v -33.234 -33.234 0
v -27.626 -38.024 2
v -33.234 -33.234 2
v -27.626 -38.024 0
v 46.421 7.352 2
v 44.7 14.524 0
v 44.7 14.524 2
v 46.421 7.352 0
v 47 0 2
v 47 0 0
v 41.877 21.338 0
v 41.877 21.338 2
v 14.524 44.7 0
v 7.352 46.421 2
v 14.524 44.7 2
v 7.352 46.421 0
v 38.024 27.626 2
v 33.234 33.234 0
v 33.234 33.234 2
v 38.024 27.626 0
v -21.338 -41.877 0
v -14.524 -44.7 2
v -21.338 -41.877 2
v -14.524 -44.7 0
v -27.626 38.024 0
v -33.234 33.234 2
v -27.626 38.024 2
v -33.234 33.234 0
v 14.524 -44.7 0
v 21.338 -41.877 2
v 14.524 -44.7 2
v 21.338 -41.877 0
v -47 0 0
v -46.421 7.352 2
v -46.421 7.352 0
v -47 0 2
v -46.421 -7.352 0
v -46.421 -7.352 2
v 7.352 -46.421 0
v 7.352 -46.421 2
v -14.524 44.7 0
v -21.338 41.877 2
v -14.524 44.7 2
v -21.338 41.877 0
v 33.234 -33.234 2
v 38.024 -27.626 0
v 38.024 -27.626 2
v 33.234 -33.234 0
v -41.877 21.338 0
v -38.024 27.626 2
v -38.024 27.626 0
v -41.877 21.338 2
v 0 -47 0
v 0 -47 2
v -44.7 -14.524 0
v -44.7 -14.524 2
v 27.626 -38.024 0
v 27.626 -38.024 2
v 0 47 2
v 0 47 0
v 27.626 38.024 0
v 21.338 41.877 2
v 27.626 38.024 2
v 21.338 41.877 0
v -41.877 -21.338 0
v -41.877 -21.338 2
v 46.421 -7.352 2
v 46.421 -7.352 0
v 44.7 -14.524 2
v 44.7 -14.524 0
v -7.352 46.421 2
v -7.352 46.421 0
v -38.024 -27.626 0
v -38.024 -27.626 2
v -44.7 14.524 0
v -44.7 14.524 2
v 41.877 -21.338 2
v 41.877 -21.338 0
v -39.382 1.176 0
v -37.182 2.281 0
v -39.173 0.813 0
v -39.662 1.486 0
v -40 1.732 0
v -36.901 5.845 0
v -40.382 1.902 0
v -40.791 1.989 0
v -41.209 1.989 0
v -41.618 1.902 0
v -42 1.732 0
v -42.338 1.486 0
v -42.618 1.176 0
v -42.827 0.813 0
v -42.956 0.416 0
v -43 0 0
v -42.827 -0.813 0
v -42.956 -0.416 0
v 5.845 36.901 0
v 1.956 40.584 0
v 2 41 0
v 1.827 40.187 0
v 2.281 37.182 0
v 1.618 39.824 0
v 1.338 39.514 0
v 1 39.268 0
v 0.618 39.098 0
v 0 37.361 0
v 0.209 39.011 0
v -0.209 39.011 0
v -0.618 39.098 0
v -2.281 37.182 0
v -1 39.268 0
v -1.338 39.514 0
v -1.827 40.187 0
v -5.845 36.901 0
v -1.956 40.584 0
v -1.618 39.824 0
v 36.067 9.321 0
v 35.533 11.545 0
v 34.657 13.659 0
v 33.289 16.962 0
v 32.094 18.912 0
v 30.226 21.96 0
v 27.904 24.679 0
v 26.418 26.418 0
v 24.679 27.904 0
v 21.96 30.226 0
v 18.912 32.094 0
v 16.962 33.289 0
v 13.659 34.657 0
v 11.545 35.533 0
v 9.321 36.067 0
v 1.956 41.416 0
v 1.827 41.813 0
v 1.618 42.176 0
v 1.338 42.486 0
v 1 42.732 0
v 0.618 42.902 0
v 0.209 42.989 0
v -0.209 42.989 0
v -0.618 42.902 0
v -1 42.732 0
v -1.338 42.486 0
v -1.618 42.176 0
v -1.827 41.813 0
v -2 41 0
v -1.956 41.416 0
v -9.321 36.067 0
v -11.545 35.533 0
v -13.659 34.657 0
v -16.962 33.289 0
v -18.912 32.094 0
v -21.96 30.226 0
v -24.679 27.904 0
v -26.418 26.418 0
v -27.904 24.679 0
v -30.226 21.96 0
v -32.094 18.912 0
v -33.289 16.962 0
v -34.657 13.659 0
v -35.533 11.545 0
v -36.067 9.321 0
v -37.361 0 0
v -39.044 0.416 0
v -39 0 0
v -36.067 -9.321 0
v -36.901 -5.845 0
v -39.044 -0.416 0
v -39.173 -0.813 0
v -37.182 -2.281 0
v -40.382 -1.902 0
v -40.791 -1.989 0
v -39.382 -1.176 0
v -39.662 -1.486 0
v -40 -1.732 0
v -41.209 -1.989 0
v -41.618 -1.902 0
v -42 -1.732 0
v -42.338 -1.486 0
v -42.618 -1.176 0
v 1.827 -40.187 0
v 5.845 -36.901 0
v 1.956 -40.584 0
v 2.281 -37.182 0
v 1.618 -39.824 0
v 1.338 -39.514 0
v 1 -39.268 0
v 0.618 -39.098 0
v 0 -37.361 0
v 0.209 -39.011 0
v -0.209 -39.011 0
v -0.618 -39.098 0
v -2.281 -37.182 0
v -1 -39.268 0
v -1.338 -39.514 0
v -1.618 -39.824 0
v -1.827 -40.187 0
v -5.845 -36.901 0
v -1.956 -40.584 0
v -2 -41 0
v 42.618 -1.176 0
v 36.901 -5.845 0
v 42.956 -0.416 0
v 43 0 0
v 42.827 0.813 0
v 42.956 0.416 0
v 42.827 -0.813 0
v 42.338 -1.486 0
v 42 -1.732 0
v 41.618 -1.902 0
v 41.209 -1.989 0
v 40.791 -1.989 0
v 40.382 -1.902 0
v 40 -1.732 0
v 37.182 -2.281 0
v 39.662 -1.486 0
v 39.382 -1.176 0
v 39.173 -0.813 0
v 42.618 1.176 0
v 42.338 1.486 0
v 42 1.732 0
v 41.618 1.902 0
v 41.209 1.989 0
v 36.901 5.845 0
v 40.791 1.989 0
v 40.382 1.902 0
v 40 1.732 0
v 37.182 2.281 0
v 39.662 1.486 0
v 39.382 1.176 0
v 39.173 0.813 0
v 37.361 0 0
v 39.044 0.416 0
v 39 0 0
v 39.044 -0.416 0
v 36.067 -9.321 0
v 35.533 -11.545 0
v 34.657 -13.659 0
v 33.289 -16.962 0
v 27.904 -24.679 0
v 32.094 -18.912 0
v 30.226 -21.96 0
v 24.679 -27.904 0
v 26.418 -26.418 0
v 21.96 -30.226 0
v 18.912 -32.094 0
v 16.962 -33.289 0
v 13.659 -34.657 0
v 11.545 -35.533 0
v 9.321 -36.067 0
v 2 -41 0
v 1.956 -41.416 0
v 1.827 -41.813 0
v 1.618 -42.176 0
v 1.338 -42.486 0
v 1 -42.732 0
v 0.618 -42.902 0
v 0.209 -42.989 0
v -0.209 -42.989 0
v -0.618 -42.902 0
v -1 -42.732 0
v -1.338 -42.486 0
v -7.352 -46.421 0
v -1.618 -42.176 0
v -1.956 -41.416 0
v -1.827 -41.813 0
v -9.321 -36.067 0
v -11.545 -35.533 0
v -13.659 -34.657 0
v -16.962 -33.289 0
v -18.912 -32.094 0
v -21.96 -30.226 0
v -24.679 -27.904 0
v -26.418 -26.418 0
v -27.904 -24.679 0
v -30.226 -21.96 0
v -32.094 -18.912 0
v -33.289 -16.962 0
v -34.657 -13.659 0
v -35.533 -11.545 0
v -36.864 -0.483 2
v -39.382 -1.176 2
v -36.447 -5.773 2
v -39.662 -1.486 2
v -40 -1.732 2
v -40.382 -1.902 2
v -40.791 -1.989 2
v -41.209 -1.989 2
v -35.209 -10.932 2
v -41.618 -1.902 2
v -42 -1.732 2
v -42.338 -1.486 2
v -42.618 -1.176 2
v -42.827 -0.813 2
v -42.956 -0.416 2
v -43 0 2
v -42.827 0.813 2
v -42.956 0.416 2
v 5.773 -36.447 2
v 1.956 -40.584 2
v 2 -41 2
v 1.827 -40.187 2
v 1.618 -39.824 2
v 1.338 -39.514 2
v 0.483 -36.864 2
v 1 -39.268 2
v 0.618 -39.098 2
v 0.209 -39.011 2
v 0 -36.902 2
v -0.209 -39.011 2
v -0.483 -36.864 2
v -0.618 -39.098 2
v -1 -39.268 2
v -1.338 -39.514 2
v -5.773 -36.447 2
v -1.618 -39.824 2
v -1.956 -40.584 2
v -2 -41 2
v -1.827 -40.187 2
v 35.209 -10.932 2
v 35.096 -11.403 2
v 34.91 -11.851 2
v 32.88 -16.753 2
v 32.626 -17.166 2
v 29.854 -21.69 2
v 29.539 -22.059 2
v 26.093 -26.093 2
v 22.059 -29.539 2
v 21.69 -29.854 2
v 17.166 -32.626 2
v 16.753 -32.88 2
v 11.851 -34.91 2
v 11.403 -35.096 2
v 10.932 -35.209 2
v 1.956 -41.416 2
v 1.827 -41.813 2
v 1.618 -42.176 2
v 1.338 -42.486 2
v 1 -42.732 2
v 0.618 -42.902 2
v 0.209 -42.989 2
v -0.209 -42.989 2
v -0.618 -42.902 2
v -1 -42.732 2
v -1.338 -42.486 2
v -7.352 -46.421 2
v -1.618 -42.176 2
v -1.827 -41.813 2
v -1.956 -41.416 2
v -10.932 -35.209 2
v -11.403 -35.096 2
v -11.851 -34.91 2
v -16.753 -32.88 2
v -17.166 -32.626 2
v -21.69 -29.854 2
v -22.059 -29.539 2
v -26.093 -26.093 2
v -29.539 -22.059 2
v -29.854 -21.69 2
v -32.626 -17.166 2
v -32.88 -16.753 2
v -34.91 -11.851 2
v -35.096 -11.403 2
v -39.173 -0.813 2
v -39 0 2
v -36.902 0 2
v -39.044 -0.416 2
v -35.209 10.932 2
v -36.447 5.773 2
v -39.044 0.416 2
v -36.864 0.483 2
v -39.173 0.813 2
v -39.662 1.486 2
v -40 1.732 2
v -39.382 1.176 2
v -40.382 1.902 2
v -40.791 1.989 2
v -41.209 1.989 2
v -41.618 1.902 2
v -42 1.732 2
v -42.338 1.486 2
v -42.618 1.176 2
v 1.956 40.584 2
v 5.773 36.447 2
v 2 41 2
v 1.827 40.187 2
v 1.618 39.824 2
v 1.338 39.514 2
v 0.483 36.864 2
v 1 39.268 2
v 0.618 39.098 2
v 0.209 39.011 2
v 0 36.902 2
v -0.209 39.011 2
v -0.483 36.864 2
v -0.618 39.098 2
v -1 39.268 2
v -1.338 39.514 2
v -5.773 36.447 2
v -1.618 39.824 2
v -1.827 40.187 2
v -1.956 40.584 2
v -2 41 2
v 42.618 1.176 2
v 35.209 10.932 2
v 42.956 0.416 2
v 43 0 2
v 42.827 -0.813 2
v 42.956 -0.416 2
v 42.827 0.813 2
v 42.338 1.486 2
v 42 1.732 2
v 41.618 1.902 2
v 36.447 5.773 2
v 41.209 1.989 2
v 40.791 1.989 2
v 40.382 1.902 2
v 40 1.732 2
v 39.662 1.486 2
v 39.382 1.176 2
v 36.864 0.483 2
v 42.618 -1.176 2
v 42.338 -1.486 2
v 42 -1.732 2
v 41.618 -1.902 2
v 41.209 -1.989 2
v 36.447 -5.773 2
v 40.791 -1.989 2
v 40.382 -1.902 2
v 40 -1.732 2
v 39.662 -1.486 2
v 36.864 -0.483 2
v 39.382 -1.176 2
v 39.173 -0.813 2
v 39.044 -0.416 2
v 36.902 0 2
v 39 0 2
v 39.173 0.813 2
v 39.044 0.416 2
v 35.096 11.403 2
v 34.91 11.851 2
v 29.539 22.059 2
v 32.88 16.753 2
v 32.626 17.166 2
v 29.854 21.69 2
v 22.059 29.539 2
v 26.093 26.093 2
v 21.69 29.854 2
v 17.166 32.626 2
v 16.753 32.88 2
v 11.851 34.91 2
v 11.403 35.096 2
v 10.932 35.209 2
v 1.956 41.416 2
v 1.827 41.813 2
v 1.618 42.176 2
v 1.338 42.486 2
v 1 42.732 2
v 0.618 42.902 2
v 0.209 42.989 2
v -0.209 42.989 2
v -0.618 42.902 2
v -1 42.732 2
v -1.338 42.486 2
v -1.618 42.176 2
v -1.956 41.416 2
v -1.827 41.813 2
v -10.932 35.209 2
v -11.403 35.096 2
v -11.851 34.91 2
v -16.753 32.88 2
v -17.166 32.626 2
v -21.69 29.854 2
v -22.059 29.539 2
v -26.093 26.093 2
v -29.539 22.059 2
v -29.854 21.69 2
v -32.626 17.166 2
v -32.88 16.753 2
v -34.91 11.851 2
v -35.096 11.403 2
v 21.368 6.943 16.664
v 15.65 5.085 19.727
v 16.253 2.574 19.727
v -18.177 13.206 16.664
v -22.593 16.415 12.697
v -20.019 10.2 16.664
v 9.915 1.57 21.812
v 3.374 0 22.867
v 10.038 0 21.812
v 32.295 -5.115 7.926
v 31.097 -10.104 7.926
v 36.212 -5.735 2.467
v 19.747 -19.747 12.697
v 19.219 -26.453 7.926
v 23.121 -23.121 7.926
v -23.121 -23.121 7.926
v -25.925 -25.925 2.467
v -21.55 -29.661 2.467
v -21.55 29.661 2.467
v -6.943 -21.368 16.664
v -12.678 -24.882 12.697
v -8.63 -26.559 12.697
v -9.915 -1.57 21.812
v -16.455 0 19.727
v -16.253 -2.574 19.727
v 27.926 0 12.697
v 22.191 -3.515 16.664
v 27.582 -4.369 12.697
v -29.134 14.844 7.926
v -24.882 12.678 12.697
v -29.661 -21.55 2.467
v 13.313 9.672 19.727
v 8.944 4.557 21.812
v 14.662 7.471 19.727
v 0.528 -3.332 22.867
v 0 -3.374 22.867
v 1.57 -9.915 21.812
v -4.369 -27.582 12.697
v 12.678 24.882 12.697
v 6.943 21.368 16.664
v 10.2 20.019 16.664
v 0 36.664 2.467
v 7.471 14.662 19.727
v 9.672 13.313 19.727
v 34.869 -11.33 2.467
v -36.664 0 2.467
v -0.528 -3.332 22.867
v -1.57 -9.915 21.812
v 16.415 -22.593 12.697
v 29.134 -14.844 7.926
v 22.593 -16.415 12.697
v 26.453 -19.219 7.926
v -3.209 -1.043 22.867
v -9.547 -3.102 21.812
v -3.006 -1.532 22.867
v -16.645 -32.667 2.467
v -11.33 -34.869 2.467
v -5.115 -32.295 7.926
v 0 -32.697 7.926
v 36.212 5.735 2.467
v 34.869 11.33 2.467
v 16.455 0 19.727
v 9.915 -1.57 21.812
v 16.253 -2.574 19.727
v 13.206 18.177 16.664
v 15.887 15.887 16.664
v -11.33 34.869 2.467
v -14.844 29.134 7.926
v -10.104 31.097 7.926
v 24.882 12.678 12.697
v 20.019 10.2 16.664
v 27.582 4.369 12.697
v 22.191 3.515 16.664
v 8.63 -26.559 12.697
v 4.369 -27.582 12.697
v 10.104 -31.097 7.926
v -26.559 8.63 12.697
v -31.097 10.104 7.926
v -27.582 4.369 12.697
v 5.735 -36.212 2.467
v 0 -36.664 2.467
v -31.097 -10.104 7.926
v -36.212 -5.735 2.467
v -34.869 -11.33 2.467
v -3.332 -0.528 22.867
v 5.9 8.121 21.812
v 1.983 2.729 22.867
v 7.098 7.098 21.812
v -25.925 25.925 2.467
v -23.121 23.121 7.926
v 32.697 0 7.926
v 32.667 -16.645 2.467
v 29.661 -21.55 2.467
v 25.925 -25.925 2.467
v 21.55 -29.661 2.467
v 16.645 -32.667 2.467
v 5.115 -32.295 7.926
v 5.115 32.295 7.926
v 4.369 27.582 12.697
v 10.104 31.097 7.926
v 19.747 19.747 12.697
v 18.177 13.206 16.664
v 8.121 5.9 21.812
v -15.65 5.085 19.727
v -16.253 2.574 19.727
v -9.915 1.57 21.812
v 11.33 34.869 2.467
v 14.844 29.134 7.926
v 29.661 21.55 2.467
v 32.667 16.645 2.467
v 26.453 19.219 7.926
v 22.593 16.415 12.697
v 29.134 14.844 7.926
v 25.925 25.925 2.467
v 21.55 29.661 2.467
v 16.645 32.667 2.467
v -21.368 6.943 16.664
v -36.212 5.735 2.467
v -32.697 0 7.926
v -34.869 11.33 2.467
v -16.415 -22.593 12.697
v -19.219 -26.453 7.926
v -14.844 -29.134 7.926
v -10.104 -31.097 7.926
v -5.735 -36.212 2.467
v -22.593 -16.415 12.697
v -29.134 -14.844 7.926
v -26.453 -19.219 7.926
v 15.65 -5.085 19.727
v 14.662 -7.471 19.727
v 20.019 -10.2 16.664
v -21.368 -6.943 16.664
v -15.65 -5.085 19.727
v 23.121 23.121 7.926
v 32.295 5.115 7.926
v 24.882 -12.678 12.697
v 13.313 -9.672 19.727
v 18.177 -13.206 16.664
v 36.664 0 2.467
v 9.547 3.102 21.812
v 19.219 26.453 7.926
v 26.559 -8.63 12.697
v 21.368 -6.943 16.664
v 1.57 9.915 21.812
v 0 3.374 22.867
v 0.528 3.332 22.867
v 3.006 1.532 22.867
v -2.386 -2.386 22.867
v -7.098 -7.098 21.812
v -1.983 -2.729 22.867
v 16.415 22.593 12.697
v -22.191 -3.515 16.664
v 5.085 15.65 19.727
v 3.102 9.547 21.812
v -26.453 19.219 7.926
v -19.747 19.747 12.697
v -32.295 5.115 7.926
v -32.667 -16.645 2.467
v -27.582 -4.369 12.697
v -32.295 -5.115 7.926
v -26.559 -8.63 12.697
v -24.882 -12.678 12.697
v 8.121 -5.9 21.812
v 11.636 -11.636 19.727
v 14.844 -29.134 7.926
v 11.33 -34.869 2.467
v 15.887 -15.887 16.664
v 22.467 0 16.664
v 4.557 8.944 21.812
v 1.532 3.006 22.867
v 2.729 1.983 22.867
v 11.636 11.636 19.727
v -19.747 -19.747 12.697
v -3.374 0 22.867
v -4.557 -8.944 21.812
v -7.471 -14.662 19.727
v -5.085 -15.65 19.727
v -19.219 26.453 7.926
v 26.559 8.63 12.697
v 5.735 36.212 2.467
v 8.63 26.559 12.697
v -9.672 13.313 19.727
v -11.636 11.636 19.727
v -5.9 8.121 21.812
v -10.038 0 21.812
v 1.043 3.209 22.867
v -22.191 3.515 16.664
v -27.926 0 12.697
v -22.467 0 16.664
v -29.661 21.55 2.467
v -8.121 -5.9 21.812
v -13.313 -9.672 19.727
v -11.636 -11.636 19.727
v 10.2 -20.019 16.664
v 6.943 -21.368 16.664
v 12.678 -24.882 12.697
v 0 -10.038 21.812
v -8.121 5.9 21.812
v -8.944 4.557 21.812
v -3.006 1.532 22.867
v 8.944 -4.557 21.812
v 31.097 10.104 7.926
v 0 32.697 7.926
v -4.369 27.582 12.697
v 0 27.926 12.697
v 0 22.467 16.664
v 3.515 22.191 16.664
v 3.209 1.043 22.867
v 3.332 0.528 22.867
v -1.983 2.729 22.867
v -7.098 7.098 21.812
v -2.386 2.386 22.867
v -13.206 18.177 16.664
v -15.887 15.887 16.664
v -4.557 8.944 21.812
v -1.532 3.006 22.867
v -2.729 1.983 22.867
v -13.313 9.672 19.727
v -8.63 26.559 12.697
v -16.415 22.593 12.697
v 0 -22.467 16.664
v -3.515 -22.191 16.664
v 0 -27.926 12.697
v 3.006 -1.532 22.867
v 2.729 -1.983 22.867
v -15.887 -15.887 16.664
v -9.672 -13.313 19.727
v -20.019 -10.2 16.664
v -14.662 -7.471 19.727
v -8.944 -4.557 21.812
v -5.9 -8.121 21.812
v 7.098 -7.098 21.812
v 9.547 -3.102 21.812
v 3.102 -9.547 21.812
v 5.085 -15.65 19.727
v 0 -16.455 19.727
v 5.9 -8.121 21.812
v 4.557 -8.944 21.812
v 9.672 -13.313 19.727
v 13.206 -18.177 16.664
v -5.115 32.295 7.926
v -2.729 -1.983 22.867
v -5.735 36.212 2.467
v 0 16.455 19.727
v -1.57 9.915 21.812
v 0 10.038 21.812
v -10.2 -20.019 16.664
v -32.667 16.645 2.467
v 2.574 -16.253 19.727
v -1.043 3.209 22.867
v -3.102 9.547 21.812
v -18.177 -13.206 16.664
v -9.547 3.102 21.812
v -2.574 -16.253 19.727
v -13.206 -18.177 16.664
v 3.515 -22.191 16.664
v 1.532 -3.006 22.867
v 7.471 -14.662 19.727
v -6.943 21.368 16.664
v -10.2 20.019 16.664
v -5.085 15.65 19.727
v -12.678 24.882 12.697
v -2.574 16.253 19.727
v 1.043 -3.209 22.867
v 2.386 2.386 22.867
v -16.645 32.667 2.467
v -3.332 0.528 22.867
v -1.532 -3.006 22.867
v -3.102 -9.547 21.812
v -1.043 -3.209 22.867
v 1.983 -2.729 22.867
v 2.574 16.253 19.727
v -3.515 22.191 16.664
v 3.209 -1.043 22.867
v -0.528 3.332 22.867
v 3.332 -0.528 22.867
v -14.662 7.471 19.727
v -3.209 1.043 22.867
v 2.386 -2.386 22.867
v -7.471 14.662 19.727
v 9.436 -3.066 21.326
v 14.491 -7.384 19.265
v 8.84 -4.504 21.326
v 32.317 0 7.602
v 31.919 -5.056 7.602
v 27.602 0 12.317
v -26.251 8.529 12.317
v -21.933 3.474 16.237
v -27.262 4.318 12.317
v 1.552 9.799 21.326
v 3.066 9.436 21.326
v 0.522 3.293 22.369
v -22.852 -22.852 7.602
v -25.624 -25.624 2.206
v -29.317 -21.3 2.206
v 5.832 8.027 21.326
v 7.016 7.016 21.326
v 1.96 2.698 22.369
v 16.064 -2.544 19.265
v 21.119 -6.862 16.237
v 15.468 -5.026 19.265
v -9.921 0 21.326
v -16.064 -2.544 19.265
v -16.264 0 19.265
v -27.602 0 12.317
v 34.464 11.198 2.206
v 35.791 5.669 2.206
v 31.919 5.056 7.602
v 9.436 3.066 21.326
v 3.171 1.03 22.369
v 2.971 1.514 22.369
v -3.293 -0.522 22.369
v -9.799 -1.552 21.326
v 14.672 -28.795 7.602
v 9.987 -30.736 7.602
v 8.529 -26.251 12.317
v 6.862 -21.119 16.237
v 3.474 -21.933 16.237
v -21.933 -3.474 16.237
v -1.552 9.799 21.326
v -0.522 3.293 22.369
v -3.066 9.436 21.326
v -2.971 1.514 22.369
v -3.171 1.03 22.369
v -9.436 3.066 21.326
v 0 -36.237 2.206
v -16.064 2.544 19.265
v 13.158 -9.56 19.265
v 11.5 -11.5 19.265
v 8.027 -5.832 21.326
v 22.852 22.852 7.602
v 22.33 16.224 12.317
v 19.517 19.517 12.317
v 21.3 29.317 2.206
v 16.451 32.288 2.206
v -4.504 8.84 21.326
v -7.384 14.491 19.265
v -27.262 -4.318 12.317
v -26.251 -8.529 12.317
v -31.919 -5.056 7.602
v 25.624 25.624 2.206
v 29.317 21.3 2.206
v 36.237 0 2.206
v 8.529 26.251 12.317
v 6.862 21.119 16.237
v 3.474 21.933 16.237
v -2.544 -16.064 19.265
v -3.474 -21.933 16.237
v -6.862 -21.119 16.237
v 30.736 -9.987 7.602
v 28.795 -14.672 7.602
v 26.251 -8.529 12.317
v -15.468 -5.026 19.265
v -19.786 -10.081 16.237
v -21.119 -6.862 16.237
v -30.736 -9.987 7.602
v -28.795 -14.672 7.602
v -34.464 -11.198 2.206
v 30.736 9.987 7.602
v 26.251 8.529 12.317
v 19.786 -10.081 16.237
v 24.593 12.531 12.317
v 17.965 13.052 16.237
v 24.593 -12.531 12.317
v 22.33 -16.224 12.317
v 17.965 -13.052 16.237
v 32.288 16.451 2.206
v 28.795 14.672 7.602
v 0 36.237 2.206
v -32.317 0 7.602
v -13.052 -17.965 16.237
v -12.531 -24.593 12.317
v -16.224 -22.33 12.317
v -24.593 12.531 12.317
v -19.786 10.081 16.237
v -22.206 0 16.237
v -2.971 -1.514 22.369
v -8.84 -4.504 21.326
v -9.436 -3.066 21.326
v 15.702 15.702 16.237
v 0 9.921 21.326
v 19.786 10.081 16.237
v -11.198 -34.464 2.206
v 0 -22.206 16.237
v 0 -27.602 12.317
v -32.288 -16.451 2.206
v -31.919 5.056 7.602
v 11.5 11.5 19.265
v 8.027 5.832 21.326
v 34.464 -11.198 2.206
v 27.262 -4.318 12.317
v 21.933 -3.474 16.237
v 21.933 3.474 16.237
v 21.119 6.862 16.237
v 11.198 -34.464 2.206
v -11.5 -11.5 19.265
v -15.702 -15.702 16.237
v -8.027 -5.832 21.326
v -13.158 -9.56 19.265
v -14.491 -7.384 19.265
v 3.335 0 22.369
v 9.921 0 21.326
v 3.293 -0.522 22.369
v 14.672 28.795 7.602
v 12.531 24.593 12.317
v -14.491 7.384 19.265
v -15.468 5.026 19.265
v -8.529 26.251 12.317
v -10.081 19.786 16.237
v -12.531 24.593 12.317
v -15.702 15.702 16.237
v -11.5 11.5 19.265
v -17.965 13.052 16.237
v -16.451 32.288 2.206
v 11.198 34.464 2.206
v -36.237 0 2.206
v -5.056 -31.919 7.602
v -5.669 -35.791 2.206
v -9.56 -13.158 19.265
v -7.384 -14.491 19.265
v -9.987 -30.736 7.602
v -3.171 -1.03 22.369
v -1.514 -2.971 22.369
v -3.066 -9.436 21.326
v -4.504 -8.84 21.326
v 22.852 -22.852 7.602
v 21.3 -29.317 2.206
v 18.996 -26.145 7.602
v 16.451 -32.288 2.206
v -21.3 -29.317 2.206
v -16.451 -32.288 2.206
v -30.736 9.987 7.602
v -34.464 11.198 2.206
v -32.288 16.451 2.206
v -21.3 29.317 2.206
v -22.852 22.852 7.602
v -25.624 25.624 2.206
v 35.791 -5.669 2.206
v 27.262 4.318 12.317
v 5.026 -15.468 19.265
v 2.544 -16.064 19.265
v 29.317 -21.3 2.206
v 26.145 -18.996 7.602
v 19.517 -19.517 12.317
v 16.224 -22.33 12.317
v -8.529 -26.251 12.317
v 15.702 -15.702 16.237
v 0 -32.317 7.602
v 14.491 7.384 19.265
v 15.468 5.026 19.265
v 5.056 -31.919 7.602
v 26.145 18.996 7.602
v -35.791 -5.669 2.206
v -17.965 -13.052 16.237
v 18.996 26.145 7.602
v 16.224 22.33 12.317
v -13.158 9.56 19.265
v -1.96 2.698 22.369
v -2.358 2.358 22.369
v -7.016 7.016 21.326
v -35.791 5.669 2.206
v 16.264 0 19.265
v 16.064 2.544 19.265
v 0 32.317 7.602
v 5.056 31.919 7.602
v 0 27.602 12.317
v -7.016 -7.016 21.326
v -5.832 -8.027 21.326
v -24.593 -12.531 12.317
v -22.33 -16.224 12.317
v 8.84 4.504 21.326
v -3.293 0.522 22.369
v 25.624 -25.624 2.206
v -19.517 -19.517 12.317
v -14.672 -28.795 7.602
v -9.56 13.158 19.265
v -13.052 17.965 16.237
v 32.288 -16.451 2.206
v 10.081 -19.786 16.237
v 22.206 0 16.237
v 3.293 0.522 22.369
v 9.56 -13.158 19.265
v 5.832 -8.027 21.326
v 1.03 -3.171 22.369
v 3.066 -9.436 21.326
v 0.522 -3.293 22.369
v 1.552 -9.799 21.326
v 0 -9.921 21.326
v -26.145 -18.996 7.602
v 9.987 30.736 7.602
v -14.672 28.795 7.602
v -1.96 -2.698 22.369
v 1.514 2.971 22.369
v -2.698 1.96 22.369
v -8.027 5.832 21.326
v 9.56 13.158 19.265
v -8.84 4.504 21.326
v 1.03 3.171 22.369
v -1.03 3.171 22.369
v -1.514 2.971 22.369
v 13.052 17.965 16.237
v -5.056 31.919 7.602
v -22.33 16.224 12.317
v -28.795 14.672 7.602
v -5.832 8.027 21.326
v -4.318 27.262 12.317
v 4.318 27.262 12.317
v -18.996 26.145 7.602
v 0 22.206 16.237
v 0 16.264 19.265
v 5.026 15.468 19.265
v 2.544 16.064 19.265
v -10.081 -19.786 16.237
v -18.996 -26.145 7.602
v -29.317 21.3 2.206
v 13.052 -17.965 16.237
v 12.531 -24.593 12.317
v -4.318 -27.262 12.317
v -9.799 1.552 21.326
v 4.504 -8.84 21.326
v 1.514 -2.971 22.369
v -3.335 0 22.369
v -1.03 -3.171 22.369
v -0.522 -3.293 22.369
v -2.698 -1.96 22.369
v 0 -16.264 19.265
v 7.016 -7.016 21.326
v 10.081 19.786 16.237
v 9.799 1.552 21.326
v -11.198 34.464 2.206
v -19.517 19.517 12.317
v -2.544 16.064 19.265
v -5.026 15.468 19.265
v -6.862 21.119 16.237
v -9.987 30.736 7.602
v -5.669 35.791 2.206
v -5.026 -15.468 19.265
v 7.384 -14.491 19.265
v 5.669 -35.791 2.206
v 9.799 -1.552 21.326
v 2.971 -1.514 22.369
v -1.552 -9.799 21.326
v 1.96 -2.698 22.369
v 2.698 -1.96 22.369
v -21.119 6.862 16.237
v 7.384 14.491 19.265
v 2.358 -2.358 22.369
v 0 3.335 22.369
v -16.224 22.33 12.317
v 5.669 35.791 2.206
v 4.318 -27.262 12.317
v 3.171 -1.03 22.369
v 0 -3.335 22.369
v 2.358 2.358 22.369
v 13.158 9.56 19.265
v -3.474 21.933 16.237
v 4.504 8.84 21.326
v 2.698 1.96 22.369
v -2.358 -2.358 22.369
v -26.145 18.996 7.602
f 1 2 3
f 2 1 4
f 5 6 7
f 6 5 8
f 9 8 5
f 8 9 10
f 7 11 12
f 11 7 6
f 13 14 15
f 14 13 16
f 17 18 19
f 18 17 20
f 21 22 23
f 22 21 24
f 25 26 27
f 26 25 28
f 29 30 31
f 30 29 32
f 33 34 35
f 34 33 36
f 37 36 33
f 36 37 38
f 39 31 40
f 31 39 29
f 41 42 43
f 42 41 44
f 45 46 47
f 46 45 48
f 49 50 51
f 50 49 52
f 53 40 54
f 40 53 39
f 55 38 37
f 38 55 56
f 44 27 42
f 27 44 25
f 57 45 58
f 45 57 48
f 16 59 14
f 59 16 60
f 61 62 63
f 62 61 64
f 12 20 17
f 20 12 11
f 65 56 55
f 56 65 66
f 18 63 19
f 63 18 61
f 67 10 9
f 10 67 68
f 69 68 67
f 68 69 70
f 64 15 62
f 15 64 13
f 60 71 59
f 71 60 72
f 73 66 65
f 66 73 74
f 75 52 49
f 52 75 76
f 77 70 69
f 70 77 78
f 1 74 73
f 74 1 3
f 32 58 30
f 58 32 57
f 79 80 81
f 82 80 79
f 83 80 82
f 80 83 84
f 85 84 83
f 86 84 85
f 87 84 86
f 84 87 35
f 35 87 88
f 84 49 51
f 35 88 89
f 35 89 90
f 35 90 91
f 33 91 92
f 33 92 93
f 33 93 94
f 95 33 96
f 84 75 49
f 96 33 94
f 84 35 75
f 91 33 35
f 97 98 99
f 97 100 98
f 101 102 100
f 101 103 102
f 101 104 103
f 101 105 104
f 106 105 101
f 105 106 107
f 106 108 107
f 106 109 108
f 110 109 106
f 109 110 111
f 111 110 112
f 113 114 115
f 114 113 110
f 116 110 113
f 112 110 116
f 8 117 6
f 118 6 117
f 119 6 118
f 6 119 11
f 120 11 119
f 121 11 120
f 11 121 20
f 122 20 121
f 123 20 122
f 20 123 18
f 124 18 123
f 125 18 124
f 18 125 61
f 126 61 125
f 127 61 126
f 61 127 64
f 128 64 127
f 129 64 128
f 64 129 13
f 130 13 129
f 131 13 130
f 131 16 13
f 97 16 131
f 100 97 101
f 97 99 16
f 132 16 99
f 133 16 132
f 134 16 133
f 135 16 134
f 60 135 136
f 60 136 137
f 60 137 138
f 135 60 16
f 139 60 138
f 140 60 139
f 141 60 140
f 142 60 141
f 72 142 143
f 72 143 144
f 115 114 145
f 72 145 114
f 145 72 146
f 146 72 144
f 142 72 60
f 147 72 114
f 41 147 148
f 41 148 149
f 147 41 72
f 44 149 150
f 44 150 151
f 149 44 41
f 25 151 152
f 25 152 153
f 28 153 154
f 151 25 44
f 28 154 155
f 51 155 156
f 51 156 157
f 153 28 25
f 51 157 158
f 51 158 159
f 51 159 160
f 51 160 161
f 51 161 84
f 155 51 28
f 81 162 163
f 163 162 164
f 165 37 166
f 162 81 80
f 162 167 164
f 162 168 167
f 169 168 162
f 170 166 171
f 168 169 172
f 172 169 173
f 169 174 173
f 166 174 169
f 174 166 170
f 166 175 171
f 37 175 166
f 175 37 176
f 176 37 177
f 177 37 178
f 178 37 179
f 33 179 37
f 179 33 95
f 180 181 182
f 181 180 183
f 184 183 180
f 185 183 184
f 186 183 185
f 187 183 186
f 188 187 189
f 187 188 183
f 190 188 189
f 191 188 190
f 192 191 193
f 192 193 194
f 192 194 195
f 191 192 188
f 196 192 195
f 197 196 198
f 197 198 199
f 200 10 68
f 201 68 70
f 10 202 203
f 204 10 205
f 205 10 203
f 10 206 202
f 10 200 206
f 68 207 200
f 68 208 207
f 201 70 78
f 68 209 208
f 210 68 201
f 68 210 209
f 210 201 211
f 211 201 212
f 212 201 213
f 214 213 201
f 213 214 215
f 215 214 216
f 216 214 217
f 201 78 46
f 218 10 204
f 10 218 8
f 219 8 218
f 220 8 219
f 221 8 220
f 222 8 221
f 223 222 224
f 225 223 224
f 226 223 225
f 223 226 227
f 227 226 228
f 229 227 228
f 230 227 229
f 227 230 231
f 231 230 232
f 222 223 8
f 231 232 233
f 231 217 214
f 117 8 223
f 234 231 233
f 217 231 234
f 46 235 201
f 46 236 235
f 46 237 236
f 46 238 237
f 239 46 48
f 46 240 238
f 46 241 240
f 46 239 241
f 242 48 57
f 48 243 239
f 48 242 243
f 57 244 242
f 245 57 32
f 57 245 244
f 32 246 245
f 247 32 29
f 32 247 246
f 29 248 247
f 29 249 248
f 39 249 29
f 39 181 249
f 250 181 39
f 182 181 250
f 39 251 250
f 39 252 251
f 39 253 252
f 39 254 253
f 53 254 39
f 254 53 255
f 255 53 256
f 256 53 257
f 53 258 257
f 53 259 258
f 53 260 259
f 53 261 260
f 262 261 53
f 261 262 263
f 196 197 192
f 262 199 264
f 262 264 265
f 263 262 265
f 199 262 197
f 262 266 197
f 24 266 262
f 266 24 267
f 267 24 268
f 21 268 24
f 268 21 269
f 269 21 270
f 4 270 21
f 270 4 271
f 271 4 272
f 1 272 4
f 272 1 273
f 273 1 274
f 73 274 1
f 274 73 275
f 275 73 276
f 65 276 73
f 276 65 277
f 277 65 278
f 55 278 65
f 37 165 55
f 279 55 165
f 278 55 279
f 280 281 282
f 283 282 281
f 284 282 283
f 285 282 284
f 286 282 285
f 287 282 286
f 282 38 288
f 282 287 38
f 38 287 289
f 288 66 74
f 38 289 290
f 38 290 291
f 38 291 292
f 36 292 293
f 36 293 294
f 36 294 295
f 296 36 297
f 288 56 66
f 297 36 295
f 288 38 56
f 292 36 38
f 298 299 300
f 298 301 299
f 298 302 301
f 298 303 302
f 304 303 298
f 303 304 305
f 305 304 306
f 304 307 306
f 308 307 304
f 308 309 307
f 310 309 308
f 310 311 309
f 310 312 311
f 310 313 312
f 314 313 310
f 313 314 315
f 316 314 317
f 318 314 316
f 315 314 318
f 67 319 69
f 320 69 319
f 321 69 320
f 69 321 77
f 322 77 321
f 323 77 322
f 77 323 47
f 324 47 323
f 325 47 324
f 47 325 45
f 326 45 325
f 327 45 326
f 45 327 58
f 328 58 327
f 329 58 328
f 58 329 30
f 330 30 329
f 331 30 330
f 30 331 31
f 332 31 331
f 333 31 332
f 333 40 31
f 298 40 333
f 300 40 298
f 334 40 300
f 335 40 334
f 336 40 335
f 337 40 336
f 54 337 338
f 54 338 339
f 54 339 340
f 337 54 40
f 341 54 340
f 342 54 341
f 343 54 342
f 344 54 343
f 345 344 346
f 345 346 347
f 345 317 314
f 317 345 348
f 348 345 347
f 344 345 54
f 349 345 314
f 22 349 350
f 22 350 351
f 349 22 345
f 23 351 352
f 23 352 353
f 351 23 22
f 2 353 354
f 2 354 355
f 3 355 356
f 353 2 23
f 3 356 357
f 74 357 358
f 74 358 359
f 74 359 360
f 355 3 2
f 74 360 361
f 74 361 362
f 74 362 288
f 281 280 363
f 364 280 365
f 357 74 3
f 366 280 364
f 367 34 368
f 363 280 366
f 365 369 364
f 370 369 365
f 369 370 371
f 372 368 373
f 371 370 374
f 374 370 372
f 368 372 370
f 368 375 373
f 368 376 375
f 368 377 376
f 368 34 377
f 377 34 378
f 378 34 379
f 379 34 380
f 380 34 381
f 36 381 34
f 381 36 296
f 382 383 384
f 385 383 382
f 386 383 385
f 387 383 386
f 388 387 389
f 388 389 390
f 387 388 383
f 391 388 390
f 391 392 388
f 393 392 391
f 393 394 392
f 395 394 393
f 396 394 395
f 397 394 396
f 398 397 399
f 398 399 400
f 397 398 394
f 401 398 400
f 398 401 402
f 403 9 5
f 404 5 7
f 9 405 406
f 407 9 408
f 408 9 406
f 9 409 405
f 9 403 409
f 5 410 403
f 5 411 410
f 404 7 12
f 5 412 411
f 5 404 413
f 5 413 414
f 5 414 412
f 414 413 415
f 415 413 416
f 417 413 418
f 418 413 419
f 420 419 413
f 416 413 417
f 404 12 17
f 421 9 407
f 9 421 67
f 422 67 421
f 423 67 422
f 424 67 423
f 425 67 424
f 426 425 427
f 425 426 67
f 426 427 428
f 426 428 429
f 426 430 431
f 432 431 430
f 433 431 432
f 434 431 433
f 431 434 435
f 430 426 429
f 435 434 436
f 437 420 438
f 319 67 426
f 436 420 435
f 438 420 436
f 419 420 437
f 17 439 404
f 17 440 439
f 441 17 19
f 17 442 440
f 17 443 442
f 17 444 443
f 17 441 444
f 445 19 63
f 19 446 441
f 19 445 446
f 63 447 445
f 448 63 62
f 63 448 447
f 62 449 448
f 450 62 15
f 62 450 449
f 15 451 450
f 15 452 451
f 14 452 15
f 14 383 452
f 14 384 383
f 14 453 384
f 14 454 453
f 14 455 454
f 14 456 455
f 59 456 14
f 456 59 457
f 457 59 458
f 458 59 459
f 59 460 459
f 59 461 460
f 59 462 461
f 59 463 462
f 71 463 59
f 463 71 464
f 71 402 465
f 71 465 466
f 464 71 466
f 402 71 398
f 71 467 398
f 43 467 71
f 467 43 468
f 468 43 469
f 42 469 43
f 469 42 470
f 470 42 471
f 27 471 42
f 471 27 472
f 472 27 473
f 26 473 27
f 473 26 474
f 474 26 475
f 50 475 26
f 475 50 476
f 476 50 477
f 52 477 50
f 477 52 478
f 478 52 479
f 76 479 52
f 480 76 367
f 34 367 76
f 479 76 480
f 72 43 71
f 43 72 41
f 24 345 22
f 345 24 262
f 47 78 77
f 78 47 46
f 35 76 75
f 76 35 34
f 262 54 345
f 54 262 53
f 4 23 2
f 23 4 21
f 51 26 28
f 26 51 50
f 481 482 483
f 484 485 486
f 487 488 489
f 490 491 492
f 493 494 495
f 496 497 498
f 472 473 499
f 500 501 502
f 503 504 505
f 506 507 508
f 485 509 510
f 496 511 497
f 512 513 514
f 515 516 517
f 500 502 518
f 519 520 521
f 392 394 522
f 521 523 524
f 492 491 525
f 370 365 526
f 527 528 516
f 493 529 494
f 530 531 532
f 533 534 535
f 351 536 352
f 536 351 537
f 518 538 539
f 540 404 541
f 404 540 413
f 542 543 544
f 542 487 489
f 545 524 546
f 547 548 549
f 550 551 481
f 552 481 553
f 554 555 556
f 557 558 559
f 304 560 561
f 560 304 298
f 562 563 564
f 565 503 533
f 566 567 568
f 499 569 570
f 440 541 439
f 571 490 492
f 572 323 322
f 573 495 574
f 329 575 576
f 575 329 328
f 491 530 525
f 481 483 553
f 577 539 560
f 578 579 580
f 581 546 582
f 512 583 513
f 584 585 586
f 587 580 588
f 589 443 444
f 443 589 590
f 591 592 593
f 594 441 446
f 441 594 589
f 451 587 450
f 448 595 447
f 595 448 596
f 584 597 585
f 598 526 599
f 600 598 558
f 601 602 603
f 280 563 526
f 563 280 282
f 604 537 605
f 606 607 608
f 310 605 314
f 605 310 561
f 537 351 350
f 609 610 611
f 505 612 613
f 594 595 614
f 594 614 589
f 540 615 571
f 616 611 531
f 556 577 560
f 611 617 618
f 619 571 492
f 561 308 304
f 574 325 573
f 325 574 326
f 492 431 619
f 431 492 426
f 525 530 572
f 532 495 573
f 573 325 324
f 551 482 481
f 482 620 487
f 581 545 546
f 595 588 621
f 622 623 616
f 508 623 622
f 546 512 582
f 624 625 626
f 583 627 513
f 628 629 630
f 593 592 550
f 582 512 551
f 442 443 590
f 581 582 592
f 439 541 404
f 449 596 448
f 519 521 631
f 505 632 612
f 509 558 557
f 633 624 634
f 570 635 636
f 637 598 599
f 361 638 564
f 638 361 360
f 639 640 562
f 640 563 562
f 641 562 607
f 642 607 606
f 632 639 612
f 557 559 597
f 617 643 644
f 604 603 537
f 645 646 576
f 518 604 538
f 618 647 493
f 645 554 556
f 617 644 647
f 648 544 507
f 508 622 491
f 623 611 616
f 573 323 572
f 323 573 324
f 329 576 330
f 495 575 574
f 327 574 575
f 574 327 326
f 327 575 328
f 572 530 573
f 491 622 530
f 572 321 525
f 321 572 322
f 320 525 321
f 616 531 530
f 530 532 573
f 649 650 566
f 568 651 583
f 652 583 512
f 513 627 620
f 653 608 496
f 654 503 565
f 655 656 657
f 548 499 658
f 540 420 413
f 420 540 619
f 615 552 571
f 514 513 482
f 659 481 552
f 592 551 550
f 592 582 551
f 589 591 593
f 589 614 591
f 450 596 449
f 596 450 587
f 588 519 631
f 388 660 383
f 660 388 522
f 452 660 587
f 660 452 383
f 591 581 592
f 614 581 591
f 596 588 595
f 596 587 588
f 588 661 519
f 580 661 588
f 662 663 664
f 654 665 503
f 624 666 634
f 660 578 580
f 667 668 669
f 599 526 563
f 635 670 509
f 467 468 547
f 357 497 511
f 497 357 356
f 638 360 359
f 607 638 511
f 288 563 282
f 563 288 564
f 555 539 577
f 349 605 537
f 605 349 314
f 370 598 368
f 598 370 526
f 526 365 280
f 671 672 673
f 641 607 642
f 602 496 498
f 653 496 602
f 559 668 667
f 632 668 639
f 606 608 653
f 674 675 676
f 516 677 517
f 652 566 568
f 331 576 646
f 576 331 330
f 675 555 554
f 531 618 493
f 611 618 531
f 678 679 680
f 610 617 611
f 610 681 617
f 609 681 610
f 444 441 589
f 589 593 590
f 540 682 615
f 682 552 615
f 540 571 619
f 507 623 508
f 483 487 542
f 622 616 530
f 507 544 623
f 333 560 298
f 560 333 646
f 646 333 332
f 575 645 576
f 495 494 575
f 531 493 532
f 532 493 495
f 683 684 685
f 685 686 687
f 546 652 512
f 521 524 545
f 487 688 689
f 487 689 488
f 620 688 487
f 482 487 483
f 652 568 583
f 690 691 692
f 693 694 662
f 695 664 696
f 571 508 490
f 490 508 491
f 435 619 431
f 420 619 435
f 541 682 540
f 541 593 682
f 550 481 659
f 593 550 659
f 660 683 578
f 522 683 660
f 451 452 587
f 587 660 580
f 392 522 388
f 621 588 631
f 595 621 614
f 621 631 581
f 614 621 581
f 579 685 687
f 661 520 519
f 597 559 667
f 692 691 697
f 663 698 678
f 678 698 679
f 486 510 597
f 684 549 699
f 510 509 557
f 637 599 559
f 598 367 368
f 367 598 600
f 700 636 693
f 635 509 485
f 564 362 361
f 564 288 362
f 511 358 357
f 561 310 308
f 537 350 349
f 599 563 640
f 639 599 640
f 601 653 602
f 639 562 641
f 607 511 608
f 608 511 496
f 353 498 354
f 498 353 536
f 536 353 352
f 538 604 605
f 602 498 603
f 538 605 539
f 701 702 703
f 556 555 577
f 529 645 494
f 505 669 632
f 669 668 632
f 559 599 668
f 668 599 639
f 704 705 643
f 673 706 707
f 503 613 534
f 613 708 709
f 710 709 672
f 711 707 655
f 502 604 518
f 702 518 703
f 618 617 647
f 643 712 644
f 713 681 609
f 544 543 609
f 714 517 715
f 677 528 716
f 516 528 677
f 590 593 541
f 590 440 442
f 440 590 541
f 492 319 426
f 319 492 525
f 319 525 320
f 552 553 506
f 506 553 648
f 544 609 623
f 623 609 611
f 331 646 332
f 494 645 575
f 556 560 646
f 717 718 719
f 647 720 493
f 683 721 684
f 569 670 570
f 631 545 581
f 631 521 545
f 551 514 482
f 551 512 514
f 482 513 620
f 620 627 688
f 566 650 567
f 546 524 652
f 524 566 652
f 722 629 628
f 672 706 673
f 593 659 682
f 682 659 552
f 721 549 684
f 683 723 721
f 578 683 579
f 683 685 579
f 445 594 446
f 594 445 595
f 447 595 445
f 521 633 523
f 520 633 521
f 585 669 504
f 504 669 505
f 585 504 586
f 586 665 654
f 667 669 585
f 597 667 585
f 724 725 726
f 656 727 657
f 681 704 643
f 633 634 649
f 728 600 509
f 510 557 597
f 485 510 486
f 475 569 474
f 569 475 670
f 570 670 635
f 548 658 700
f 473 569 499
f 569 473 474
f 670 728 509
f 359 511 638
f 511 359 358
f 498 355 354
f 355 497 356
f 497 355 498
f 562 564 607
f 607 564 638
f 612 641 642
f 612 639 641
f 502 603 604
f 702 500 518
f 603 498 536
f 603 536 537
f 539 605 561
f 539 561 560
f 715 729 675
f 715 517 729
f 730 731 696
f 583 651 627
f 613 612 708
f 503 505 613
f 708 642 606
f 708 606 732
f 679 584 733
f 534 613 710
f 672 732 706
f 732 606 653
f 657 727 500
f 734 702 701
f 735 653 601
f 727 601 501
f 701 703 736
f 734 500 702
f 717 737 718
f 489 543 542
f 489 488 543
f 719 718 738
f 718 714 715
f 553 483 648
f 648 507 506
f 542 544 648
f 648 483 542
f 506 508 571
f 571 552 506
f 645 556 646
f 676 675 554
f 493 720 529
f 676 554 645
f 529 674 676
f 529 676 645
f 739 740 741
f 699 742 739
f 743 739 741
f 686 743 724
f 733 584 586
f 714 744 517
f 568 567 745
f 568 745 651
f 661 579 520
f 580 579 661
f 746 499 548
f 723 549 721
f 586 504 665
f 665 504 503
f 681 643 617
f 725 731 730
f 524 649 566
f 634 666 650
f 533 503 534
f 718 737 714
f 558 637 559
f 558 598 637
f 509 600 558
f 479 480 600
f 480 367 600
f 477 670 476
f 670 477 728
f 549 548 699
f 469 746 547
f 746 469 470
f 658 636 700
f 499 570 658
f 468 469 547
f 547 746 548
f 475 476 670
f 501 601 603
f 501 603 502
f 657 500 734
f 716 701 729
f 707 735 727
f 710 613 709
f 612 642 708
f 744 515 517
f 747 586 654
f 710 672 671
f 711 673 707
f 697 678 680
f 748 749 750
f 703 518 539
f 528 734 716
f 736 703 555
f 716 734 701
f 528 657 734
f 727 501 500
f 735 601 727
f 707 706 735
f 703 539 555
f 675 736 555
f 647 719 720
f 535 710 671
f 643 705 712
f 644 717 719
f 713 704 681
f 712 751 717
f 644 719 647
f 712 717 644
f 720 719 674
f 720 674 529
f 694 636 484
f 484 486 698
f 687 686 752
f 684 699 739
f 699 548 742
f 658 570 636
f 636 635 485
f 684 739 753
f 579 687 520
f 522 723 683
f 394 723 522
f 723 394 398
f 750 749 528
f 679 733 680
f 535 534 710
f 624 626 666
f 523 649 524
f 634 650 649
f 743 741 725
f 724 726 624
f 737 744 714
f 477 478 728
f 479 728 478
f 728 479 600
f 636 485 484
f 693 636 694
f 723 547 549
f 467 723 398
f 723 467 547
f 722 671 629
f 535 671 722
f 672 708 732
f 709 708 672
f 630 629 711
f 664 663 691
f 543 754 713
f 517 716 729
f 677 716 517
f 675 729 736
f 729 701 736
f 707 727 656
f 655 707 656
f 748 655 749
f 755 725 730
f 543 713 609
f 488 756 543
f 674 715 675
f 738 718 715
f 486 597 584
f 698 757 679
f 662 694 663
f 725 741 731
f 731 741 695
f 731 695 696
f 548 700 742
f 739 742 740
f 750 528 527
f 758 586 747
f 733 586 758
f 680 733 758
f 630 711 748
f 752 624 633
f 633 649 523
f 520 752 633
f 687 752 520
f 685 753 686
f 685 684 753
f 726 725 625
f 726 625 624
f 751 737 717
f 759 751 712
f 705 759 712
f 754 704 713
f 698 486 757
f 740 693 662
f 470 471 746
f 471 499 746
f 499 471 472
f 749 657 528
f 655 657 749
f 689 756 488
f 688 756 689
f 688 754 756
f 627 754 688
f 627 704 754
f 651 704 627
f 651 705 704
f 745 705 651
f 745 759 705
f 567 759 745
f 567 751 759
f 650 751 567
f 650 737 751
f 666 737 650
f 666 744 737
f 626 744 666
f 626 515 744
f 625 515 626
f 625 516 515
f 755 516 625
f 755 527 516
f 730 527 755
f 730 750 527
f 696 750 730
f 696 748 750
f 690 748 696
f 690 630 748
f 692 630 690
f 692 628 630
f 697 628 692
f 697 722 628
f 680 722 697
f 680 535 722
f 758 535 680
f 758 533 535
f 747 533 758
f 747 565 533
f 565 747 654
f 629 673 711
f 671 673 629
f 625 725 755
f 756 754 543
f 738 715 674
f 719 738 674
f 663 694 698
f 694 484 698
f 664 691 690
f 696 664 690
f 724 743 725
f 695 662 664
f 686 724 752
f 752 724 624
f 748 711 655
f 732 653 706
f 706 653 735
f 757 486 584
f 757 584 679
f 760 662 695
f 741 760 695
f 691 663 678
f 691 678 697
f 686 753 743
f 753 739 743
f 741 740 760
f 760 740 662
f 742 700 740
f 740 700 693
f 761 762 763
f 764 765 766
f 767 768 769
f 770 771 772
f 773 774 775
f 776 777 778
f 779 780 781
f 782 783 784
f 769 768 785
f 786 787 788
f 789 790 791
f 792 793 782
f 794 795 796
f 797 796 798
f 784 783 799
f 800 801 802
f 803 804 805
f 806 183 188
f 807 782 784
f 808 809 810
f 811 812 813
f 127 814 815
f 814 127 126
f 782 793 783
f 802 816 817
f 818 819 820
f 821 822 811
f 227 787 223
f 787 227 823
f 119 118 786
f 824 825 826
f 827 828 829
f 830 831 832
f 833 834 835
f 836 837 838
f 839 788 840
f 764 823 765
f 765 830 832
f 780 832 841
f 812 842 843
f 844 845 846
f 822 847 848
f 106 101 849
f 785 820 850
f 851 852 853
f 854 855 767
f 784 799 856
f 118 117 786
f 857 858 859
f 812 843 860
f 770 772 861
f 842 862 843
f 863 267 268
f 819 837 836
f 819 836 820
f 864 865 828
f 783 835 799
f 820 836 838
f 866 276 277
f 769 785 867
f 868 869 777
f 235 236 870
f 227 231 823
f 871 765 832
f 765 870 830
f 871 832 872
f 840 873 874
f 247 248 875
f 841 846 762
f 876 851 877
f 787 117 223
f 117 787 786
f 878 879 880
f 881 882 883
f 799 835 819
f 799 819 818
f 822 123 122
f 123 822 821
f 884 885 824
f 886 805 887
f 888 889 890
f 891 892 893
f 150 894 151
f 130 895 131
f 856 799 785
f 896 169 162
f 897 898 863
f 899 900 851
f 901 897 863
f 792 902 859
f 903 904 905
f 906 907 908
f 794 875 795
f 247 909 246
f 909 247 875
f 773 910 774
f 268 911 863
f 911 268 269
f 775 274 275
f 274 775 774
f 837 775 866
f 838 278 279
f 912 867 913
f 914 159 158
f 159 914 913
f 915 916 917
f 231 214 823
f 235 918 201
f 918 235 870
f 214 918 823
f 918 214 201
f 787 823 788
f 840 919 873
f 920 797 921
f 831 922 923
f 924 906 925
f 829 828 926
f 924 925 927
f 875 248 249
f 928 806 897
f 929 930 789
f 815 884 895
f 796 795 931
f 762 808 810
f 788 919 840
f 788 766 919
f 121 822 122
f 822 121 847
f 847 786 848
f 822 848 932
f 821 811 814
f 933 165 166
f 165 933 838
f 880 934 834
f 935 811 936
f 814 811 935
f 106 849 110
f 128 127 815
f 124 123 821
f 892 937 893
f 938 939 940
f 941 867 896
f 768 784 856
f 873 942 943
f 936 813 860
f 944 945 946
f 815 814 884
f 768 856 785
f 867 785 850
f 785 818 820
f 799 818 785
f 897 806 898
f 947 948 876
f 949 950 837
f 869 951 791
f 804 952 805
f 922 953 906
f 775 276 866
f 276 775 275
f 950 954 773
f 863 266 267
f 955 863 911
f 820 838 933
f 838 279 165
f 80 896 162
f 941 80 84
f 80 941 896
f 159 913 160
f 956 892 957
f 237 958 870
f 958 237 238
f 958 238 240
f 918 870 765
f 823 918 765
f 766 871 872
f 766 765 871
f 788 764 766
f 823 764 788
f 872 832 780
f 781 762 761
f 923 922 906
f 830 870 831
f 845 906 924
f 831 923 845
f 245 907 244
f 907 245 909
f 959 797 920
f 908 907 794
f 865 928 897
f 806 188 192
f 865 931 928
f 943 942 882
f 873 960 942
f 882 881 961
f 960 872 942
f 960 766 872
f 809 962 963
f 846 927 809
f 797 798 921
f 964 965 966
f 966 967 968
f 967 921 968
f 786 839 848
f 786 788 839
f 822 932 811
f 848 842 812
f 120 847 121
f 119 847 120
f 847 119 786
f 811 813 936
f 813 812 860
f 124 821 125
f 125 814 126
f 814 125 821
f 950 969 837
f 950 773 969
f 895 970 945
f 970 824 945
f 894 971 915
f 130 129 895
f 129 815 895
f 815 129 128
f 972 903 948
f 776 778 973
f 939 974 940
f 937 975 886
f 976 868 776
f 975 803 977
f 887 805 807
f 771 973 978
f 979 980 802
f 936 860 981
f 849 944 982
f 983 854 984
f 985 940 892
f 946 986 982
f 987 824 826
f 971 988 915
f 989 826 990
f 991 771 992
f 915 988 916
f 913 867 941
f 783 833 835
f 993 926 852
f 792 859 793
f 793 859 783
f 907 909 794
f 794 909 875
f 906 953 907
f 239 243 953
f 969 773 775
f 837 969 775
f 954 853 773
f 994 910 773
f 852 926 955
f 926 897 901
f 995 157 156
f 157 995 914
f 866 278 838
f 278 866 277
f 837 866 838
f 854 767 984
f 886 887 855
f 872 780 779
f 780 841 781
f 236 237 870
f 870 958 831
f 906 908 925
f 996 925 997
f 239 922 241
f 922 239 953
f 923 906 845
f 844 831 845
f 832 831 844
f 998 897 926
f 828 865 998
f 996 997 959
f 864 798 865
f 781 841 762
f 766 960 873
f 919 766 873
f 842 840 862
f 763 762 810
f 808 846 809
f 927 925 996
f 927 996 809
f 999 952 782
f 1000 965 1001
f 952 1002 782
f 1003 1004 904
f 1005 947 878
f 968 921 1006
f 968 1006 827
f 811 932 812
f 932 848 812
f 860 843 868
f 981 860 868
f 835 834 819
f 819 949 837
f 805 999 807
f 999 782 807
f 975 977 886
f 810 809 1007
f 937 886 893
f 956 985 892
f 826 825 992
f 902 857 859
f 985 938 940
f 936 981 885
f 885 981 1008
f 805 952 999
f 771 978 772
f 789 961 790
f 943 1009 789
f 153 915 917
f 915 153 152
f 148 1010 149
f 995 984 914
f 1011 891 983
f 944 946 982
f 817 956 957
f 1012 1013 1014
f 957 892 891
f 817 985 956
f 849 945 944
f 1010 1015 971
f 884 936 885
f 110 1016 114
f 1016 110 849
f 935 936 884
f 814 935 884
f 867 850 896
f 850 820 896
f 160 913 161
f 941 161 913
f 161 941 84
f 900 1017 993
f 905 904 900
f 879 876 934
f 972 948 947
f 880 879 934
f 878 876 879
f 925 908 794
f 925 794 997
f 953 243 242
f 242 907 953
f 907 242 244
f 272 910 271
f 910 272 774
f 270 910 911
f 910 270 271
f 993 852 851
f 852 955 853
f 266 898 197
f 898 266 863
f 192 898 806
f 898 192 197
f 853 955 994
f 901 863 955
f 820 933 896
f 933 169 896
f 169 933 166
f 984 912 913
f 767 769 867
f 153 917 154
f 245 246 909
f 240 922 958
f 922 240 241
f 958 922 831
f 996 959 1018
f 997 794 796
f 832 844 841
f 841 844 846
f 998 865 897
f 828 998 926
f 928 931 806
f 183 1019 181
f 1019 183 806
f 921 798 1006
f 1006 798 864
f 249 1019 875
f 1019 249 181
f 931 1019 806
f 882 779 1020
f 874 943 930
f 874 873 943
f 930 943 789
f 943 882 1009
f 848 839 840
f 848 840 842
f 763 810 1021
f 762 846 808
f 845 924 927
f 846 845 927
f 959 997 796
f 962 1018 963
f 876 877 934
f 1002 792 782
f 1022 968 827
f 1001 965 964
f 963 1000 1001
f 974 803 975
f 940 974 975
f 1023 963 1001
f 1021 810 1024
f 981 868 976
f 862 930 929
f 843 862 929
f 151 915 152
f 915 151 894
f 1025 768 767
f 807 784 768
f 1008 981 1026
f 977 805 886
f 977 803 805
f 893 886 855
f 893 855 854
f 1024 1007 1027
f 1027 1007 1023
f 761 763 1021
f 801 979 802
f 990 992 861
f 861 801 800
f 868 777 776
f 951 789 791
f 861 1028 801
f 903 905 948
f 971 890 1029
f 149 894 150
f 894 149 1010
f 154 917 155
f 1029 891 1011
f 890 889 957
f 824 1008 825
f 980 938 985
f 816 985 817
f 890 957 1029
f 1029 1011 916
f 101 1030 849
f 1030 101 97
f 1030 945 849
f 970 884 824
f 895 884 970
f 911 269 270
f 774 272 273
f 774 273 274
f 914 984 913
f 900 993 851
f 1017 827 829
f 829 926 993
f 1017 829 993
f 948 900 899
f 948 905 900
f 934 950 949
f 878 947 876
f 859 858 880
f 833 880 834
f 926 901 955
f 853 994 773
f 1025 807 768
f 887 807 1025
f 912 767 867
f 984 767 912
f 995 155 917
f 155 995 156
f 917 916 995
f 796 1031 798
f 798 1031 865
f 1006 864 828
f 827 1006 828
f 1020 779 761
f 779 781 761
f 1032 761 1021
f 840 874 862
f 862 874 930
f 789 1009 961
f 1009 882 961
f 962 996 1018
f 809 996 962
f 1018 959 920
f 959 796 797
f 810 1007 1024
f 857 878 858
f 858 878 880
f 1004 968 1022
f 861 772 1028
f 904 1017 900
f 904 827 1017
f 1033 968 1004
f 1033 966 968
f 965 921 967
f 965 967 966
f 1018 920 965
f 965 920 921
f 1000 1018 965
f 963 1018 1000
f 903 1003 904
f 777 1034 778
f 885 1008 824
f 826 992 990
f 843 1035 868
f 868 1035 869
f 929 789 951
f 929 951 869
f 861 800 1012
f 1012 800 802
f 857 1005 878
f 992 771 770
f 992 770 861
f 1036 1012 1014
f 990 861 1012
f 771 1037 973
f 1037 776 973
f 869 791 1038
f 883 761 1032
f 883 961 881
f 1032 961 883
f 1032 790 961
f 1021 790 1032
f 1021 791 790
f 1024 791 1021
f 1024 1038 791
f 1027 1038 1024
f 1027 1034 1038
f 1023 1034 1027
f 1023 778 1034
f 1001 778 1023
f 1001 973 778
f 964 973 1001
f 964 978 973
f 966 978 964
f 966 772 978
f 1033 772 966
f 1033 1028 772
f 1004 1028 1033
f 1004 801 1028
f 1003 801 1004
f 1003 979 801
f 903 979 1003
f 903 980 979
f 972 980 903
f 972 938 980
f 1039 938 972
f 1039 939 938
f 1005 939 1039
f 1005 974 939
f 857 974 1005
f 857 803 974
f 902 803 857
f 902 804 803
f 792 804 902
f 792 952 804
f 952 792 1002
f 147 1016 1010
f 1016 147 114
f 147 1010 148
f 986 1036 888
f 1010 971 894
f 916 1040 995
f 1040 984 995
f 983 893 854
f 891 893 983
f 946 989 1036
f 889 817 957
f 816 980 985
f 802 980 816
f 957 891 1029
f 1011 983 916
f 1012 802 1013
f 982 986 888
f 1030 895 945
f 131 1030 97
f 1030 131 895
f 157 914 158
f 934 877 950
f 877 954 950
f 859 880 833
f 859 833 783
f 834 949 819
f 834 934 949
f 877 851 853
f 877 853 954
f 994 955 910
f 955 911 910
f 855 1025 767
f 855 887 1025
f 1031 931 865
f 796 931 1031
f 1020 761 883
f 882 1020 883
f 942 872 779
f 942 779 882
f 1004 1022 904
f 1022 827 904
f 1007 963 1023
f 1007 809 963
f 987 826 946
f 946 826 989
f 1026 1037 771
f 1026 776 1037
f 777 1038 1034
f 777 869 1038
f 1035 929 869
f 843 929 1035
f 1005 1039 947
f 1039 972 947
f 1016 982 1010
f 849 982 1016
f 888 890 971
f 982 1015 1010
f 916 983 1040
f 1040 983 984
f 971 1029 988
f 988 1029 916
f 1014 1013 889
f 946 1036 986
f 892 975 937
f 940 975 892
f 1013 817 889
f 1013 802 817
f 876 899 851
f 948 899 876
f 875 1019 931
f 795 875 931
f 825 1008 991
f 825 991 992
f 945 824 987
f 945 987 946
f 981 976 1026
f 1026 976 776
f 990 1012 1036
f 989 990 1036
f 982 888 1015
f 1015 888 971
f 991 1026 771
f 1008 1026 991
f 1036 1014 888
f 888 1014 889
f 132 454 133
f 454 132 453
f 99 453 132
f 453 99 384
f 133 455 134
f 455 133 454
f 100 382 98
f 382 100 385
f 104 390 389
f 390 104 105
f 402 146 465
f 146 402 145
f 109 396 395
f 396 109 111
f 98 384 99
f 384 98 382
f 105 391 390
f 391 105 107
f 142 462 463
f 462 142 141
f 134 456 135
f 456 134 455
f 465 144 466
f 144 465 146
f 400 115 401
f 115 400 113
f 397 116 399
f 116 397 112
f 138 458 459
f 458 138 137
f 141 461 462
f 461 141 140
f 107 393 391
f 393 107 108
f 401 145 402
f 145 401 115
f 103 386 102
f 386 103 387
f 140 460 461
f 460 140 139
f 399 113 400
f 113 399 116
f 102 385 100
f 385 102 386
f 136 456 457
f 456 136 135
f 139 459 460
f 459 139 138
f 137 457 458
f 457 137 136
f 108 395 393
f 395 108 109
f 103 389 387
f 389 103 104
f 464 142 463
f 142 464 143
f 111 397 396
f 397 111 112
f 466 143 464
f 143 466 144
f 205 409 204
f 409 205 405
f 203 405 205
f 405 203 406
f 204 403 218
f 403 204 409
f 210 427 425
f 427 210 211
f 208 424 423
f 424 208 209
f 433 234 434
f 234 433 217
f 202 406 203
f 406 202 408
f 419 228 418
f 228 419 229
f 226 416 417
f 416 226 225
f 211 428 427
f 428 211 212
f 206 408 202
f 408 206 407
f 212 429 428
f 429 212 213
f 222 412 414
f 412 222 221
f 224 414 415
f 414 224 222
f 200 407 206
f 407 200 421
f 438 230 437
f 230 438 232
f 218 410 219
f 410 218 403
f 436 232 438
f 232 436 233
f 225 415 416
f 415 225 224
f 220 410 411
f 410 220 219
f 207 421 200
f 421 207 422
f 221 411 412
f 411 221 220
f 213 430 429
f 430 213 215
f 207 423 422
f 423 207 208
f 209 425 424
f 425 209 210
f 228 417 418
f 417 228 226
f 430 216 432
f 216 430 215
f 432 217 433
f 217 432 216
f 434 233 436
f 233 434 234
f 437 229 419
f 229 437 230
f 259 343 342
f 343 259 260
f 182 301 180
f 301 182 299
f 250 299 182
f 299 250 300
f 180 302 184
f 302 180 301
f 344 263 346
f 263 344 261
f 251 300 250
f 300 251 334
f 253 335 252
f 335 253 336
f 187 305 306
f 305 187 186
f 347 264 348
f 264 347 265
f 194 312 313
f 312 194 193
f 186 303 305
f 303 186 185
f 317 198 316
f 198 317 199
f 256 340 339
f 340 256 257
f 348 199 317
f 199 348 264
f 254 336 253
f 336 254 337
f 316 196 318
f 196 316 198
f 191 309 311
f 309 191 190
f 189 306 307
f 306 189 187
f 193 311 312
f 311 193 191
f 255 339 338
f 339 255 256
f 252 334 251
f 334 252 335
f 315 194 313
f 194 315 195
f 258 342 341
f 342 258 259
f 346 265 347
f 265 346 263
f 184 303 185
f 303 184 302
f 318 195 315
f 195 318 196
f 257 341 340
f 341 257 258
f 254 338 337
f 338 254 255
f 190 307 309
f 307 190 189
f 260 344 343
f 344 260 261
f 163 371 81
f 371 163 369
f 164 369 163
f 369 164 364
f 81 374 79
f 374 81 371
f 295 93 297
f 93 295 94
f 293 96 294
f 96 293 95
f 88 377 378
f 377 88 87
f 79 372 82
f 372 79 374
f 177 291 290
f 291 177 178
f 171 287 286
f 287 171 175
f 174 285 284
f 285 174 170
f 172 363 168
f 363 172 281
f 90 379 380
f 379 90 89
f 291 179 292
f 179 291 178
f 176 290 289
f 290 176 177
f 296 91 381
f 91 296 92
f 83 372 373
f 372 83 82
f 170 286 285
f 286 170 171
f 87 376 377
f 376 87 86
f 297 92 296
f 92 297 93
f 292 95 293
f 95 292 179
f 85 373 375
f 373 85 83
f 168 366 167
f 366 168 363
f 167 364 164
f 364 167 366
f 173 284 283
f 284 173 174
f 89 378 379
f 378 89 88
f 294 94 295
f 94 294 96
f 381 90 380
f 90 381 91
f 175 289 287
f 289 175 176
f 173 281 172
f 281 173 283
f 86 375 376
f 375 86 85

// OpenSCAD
// Eduardo Blanco Bielsa - UO285176
module placa(hc1, dc1, fnc1, des1, fnes, hc2, des2){
    difference(){
        esferaHueca(des1, fnes, hc2, des2);
        translate([0,41,-2])
        cylinder (h = hc1, d=dc1, $fn=fnc1);
        translate([41,0,-2])
        cylinder (h = hc1, d=dc1, $fn=fnc1);
        translate([0,-41,-2])
        cylinder (h = hc1, d=dc1, $fn=fnc1);
        translate([-41,0,-2])
        cylinder (h = hc1, d=dc1, $fn=fnc1);
    }
} 

module esferaHueca(des1, fnes, hc2, des2){
    difference(){
        difference(){
           esfera(hc2, des2, fnes);
           translate([0,0,-20])
           sphere(d = des1, $fn = fnes); 
        }
    translate([0,0,-80])
    cylinder (h = 80, d=94, $fn=fnes);  
}
}

module esfera(hc2, des2, fnes){
    union(){
       difference(){
          cylinder (h = hc2, d=94, $fn=fnes);
          cylinder (h = hc2, d=64, $fn=fnes);
       }
       translate([0,0,-20])
       sphere(d = des2, $fn = fnes);
    }
}

placa(4, 4, 30, 85, 40, 2, 86);
